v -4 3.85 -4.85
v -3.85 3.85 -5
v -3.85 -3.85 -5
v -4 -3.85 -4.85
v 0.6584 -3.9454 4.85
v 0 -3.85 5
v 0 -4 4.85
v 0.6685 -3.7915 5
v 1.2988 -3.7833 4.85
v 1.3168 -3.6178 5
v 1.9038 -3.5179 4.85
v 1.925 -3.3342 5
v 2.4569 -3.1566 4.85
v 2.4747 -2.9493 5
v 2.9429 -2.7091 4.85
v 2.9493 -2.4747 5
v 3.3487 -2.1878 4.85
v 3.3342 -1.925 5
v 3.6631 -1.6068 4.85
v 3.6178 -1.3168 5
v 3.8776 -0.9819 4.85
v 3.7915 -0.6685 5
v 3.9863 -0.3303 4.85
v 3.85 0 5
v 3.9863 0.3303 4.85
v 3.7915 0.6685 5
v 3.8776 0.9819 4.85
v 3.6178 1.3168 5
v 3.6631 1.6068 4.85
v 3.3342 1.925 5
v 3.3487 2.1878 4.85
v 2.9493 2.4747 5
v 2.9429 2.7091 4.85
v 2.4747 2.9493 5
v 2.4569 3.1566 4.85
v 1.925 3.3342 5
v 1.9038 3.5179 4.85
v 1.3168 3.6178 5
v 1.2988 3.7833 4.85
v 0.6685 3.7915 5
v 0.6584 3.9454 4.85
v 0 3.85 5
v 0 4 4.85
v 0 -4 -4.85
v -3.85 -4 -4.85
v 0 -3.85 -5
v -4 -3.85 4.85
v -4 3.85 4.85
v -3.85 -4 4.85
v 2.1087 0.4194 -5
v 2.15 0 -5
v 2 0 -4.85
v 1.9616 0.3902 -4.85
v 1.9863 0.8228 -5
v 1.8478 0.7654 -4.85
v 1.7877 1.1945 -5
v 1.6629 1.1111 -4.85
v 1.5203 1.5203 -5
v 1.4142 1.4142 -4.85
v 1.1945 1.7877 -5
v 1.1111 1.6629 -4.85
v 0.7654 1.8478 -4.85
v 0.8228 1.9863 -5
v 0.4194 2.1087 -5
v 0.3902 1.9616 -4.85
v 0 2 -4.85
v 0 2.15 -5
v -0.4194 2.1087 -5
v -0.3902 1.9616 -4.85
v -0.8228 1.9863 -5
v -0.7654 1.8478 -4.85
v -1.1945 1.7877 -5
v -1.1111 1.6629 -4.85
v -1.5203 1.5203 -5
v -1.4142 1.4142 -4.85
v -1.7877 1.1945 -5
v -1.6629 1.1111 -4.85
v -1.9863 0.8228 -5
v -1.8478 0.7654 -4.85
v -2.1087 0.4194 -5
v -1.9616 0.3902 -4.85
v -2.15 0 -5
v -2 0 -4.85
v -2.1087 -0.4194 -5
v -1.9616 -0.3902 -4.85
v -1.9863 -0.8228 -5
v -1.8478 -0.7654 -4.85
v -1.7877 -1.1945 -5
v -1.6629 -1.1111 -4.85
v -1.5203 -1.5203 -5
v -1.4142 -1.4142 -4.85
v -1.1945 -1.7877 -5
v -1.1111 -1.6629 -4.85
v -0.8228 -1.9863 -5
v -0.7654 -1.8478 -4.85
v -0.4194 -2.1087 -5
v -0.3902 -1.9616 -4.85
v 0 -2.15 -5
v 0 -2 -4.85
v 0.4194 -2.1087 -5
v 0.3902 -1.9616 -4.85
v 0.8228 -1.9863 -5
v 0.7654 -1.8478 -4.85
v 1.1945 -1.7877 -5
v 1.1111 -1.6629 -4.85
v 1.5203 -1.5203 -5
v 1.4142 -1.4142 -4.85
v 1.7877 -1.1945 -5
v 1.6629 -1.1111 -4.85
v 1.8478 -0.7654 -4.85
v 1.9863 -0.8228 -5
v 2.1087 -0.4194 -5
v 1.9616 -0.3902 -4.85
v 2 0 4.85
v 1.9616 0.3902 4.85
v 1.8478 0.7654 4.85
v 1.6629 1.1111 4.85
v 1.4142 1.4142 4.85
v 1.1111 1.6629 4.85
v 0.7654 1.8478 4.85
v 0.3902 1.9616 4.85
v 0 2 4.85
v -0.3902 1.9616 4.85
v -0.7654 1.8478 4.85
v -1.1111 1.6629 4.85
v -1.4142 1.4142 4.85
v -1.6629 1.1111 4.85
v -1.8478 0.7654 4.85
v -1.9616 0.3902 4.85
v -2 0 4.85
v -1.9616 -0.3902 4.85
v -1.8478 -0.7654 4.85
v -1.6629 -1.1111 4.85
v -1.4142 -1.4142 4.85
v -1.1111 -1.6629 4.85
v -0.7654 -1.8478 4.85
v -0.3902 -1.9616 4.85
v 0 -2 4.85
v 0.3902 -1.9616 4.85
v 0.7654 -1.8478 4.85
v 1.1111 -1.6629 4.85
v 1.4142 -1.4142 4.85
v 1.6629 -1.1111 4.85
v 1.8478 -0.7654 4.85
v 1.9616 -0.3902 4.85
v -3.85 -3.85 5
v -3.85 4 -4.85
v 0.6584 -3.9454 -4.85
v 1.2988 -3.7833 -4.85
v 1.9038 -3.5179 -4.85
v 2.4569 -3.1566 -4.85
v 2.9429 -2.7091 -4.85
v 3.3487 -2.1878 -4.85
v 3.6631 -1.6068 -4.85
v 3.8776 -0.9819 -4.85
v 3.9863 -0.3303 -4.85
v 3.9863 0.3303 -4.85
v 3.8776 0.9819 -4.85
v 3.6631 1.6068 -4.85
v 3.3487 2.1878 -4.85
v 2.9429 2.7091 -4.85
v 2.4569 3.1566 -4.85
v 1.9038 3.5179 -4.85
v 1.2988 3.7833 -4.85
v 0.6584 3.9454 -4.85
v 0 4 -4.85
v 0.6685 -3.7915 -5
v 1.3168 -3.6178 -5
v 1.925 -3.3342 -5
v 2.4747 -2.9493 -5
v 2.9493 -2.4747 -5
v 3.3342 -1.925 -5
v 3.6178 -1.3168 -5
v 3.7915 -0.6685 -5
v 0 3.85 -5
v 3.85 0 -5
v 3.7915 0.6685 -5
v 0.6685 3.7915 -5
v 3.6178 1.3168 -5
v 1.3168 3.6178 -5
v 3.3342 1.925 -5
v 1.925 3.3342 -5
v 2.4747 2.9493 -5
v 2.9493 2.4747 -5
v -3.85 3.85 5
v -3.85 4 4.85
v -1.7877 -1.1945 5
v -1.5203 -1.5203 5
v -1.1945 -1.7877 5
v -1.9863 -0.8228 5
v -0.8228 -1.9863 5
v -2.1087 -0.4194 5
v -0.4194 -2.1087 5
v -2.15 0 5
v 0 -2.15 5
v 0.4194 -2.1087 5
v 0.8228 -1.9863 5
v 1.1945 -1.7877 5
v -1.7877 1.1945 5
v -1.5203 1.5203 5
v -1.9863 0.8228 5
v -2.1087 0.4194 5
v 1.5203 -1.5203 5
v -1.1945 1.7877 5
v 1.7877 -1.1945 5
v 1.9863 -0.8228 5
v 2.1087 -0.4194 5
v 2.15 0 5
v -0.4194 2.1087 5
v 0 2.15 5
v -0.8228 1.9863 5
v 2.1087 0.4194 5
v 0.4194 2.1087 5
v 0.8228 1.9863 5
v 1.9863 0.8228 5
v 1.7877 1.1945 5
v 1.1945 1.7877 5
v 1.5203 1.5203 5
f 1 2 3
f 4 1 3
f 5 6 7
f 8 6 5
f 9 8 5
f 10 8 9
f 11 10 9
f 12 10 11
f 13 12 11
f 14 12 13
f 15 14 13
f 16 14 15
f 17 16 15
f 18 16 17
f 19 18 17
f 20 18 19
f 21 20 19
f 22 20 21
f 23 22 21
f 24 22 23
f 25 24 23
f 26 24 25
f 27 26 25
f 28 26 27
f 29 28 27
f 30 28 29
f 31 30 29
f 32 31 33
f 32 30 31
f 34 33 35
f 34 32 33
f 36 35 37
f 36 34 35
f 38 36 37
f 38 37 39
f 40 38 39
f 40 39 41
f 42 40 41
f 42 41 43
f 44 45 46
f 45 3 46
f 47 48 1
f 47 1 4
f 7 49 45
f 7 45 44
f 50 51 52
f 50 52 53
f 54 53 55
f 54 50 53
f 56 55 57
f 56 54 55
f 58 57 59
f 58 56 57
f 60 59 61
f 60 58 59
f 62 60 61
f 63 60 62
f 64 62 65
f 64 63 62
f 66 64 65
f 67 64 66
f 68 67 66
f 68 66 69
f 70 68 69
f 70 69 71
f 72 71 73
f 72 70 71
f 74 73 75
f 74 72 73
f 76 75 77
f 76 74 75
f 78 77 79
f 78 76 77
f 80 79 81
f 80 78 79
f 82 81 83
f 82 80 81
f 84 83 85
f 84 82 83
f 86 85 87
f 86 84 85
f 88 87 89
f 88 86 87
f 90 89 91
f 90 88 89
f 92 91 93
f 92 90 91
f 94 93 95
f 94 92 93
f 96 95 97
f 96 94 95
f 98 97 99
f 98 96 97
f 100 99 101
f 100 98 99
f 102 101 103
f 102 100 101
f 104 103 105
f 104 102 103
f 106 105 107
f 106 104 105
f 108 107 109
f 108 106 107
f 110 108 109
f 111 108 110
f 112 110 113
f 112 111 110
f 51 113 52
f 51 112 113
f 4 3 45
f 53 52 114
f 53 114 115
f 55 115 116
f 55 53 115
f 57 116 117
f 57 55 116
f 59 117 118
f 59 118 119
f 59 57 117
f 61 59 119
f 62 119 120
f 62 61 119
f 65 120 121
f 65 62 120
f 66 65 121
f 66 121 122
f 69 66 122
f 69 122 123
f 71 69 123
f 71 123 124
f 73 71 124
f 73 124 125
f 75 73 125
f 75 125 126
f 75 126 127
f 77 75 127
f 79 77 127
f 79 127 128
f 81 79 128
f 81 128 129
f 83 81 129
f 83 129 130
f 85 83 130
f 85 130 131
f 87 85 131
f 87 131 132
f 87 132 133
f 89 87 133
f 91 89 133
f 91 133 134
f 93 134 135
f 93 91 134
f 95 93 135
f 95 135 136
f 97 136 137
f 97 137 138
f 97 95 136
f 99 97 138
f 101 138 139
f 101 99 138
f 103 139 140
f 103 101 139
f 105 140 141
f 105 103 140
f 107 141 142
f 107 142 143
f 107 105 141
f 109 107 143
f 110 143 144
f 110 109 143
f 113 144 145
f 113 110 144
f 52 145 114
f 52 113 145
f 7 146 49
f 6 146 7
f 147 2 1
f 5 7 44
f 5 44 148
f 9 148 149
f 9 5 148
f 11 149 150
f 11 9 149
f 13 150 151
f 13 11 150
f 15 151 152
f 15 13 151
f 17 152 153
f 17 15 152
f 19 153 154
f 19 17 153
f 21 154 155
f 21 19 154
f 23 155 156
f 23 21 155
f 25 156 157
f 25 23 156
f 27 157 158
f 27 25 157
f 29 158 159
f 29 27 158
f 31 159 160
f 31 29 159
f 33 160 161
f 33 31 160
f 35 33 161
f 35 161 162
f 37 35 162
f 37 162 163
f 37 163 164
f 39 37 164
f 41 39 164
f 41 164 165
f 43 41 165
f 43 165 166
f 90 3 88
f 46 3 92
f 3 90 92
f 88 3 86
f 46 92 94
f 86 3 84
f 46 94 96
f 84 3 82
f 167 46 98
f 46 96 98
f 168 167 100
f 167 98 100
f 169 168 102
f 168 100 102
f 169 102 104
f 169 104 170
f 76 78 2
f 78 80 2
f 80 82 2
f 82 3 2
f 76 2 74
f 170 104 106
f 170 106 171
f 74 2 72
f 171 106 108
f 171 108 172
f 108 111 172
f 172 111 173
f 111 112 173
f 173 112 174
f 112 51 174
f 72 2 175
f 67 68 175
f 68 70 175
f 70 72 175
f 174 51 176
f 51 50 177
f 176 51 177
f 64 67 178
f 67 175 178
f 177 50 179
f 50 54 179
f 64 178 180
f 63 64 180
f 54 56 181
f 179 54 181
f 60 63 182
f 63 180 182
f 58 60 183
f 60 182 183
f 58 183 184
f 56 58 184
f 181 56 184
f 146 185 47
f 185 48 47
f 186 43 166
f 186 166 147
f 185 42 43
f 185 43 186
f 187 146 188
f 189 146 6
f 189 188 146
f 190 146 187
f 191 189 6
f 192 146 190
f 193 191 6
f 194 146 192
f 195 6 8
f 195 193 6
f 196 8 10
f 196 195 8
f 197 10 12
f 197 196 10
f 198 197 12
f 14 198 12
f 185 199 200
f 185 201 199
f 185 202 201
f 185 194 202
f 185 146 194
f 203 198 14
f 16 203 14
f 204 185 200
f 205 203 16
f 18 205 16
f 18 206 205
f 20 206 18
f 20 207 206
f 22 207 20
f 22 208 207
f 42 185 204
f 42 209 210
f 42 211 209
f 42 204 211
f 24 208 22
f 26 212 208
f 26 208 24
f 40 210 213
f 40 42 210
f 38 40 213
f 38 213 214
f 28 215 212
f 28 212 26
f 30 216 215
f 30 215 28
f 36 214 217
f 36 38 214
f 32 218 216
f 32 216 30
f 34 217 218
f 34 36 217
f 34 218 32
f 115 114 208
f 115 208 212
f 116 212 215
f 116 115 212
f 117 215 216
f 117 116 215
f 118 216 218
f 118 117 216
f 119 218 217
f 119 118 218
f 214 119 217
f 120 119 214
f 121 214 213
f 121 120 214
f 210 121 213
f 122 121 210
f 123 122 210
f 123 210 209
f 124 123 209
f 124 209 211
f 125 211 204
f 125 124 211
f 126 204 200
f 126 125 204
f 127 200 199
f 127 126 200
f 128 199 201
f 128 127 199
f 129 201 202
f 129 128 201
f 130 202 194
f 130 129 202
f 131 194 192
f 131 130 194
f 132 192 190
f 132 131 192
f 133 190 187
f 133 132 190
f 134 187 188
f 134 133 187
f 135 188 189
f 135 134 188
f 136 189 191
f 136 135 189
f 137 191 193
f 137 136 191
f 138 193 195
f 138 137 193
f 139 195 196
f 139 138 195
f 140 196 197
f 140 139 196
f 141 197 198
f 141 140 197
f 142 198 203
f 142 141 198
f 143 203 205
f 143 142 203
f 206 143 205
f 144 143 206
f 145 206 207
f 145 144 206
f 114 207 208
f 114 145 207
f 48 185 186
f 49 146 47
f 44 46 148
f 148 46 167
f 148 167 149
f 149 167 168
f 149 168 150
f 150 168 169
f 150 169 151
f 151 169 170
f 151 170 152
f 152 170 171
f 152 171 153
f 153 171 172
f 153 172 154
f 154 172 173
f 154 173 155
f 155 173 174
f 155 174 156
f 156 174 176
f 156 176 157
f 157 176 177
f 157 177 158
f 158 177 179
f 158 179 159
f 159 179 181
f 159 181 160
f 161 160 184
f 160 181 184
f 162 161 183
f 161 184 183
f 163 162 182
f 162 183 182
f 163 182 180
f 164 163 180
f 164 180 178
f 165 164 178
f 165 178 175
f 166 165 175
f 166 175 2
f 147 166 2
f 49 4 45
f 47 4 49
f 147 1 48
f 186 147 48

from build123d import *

# Parameters (mm, degrees)
SKETCH1_R           = 2
BOSS_EXTRUDE1_DEPTH = 5
CHAMFER1_SIZE       = 0.15


with BuildPart() as part:
    # Sketch1 → Boss-Extrude1 (new, symmetric)
    with BuildSketch(Plane.XY):
        with BuildLine():
            Line((0, 4), (-4, 4))
            Line((-4, 4), (-4, -4))
            Line((-4, -4), (0, -4))
            ThreePointArc((0, -4), (4, 0), (0, 4))
        make_face()
        Circle(SKETCH1_R, mode=Mode.SUBTRACT)
    extrude(amount=BOSS_EXTRUDE1_DEPTH, both=True)

    # Chamfer1
    chamfer1_edges = [part.edges().sort_by_distance(p)[0] for p in [
        (-2, 0, -5),
        (-2, 0, 5),
        (-4, 0, 5),
        (-2, -4, 5),
        (4, 0, 5),
        (-2, -4, -5),
        (-4, 0, -5),
        (-2, 4, -5),
        (4, 0, -5),
        (-4, -4, 0),
        (-4, 4, 0),
        (-2, 4, 5),
    ]]
    chamfer(chamfer1_edges, length=CHAMFER1_SIZE)


solid = part.part
